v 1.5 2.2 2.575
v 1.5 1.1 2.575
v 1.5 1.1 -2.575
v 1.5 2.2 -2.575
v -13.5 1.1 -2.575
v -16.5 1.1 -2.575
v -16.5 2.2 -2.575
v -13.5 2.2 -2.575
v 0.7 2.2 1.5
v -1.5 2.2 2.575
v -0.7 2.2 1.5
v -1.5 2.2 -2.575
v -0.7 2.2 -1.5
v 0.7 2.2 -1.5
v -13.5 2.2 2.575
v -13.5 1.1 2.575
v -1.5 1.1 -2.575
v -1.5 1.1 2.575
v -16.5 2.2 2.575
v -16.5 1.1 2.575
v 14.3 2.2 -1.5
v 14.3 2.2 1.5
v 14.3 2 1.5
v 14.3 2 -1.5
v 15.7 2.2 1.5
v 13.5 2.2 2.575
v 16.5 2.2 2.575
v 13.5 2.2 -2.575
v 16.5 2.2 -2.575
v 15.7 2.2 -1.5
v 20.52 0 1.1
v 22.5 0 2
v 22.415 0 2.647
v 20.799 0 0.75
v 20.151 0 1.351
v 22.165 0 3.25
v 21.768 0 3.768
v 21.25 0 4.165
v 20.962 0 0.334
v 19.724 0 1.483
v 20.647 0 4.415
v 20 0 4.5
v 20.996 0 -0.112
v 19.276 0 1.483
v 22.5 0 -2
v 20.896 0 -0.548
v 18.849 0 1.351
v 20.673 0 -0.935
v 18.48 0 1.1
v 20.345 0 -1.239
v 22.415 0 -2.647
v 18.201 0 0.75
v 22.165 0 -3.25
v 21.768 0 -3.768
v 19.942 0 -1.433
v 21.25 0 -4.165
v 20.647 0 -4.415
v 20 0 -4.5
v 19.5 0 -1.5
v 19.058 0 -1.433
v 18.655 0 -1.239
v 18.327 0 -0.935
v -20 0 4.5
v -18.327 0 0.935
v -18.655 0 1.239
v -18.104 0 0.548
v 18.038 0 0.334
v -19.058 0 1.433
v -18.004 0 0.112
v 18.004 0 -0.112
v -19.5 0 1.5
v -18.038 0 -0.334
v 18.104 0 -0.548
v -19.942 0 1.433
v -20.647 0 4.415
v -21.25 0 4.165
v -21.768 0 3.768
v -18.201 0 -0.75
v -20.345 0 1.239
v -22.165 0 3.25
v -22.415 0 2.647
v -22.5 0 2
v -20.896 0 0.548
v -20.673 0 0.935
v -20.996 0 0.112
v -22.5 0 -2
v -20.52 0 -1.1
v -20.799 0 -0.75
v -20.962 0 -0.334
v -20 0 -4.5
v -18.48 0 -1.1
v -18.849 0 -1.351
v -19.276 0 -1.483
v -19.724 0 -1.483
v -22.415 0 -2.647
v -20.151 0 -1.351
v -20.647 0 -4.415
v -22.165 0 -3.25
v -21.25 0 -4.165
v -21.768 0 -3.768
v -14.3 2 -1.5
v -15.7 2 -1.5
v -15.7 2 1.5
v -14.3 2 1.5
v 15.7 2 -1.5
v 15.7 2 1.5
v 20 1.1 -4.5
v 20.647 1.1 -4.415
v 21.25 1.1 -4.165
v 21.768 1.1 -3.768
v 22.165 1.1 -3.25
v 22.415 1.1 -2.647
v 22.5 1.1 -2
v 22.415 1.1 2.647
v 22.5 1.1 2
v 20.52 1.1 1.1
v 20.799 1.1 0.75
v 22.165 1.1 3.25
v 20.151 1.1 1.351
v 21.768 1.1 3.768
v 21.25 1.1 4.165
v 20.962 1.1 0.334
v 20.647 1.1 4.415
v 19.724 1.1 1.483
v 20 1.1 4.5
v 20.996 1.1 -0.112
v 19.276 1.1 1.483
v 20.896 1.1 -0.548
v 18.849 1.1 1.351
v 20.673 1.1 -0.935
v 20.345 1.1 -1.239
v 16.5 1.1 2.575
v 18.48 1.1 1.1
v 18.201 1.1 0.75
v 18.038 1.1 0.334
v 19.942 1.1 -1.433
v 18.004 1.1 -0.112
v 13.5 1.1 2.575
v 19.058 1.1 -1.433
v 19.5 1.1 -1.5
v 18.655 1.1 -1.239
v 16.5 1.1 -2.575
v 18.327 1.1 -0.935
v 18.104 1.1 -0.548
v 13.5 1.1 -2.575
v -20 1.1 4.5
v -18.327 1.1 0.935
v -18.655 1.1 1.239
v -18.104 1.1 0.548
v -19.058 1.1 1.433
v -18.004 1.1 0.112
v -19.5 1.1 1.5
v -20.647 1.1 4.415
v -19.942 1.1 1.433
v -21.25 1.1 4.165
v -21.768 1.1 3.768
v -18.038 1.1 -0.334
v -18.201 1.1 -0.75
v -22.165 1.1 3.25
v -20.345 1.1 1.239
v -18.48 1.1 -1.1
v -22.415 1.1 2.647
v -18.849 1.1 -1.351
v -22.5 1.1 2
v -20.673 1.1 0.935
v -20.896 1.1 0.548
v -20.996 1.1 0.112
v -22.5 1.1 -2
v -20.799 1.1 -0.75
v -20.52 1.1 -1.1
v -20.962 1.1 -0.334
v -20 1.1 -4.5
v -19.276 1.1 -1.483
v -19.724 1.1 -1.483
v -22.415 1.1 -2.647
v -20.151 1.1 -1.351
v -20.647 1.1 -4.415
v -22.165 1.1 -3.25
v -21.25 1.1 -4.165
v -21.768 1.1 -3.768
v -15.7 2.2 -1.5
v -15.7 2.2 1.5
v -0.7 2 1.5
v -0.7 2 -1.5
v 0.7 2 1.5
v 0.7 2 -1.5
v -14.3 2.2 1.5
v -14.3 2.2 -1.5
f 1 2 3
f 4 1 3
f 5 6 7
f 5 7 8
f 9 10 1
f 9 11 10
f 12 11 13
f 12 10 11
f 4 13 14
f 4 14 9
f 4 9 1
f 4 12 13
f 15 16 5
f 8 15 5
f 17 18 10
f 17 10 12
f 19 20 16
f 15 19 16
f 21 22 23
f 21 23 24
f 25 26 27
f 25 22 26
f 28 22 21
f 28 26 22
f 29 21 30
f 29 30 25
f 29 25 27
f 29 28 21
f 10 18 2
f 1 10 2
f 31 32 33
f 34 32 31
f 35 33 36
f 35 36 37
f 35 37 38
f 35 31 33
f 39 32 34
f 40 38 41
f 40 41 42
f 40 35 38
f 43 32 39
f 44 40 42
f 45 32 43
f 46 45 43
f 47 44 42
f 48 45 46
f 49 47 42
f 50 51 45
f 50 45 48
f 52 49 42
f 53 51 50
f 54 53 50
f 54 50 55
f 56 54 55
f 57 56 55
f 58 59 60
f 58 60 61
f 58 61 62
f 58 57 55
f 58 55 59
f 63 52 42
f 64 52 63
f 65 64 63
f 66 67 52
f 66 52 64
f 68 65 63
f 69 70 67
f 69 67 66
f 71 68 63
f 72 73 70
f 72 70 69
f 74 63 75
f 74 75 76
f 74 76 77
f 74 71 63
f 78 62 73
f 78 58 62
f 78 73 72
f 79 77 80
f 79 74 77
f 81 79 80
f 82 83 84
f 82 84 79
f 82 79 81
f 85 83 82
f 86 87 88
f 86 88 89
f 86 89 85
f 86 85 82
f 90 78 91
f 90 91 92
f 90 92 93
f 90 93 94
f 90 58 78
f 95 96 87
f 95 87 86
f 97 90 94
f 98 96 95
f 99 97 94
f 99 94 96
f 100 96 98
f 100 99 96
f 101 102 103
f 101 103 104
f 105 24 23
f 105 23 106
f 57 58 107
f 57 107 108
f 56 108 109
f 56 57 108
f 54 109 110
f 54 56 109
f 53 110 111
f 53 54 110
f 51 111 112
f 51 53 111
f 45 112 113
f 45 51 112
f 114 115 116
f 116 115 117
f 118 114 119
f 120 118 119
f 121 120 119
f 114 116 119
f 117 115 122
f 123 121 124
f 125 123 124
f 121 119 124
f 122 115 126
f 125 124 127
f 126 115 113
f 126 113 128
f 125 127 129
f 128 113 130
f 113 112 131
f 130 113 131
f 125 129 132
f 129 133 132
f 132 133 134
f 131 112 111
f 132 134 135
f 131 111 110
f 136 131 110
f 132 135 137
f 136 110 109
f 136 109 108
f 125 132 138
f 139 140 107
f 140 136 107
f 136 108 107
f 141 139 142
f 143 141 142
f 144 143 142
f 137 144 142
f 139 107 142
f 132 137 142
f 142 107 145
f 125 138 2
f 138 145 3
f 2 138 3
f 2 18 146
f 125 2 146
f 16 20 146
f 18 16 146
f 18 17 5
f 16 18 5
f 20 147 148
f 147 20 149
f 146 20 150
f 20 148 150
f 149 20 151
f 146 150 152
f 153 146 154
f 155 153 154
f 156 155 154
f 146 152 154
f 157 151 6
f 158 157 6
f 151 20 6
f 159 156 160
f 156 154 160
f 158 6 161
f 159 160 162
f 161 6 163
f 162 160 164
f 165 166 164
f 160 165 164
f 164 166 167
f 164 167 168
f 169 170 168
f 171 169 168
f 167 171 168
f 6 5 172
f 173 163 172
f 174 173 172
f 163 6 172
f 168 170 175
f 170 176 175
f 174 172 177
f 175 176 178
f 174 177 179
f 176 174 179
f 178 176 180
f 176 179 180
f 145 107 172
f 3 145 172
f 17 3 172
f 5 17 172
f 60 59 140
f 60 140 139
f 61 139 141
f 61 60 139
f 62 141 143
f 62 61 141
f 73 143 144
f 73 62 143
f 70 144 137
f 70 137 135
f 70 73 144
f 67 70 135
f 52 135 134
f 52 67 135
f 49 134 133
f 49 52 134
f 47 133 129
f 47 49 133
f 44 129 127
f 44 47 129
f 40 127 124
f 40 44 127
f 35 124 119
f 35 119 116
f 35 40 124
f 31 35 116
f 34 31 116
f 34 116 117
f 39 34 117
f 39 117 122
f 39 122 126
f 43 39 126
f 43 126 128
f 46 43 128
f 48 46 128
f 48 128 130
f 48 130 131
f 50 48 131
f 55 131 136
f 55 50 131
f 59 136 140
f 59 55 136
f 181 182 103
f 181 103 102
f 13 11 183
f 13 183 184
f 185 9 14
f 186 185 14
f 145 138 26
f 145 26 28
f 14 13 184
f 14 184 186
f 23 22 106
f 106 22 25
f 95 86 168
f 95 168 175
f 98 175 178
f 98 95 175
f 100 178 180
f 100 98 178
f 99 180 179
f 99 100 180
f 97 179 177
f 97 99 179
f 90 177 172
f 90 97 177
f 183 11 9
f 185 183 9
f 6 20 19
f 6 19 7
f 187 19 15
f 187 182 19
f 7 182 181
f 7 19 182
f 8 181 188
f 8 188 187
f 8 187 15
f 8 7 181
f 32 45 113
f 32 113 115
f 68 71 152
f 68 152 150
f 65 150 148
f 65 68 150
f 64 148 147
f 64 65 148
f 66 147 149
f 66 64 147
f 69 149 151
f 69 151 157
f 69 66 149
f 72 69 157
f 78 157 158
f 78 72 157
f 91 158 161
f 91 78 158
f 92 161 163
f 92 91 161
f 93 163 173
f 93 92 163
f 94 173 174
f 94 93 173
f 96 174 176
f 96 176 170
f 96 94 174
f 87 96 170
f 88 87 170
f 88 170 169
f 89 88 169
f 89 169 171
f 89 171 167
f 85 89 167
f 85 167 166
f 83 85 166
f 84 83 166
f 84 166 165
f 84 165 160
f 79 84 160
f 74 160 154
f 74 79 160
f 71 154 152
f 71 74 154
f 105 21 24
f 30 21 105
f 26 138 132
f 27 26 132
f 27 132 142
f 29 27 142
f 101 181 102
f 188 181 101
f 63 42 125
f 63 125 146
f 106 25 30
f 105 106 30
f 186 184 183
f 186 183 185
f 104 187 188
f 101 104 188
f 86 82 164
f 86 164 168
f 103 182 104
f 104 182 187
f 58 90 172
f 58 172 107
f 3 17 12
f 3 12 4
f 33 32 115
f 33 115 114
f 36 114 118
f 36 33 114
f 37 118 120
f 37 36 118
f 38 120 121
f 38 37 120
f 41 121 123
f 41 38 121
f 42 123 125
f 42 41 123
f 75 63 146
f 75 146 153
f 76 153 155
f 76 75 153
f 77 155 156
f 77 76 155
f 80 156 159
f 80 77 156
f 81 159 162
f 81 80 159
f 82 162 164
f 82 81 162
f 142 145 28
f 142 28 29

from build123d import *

# Parameters (mm, degrees)
SKETCH1_R           = 1.5
BOSS_EXTRUDE1_DEPTH = 1.1
SKETCH2_W           = 3
SKETCH2_H           = 5.15
BOSS_EXTRUDE2_DEPTH = 1.1
SKETCH3_W           = 1.4
SKETCH3_H           = 3
CUT_EXTRUDE1_DEPTH  = 0.2


with BuildPart() as part:
    # Sketch1 → Boss-Extrude1 (new body)
    with BuildSketch(Plane(origin=(0, 0, 0), x_dir=(1, 0, 0), z_dir=(0, 1, 0))):
        with BuildLine():
            Line((-20, 4.5), (20, 4.5))
            ThreePointArc((20, 4.5), (21.767766953, 3.767766953), (22.5, 2))
            Line((22.5, 2), (22.5, -2))
            ThreePointArc((22.5, -2), (21.767766953, -3.767766953), (20, -4.5))
            Line((20, -4.5), (-20, -4.5))
            ThreePointArc((-20, -4.5), (-21.767766953, -3.767766953), (-22.5, -2))
            Line((-22.5, -2), (-22.5, 2))
            ThreePointArc((-22.5, 2), (-21.767766953, 3.767766953), (-20, 4.5))
        make_face()
        with Locations(Location((-19.5, 0, 0), (0, 0, 270))):
            Circle(SKETCH1_R, mode=Mode.SUBTRACT)
        with Locations(Location((19.5, 0, 0), (0, 0, 90))):
            Circle(SKETCH1_R, mode=Mode.SUBTRACT)
    extrude(amount=BOSS_EXTRUDE1_DEPTH)

    # Sketch2 → Boss-Extrude2 (add)
    with BuildSketch(Plane(origin=(0, 1.1, 0), x_dir=(1, 0, 0), z_dir=(0, 1, 0))):
        with Locations((15, 0)):
            Rectangle(SKETCH2_W, SKETCH2_H)
        with Locations((-15, 0)):
            Rectangle(SKETCH2_W, SKETCH2_H)
        Rectangle(SKETCH2_W, SKETCH2_H)
    extrude(amount=BOSS_EXTRUDE2_DEPTH)

    # Sketch3 → Cut-Extrude1 (cut)
    with BuildSketch(Plane(origin=(0, 2.2, 0), x_dir=(1, 0, 0), z_dir=(0, 1, 0))):
        with Locations((15, 0)):
            Rectangle(SKETCH3_W, SKETCH3_H)
        with Locations((-15, 0)):
            Rectangle(SKETCH3_W, SKETCH3_H)
        Rectangle(SKETCH3_W, SKETCH3_H)
    extrude(amount=-CUT_EXTRUDE1_DEPTH, mode=Mode.SUBTRACT)


solid = part.part
